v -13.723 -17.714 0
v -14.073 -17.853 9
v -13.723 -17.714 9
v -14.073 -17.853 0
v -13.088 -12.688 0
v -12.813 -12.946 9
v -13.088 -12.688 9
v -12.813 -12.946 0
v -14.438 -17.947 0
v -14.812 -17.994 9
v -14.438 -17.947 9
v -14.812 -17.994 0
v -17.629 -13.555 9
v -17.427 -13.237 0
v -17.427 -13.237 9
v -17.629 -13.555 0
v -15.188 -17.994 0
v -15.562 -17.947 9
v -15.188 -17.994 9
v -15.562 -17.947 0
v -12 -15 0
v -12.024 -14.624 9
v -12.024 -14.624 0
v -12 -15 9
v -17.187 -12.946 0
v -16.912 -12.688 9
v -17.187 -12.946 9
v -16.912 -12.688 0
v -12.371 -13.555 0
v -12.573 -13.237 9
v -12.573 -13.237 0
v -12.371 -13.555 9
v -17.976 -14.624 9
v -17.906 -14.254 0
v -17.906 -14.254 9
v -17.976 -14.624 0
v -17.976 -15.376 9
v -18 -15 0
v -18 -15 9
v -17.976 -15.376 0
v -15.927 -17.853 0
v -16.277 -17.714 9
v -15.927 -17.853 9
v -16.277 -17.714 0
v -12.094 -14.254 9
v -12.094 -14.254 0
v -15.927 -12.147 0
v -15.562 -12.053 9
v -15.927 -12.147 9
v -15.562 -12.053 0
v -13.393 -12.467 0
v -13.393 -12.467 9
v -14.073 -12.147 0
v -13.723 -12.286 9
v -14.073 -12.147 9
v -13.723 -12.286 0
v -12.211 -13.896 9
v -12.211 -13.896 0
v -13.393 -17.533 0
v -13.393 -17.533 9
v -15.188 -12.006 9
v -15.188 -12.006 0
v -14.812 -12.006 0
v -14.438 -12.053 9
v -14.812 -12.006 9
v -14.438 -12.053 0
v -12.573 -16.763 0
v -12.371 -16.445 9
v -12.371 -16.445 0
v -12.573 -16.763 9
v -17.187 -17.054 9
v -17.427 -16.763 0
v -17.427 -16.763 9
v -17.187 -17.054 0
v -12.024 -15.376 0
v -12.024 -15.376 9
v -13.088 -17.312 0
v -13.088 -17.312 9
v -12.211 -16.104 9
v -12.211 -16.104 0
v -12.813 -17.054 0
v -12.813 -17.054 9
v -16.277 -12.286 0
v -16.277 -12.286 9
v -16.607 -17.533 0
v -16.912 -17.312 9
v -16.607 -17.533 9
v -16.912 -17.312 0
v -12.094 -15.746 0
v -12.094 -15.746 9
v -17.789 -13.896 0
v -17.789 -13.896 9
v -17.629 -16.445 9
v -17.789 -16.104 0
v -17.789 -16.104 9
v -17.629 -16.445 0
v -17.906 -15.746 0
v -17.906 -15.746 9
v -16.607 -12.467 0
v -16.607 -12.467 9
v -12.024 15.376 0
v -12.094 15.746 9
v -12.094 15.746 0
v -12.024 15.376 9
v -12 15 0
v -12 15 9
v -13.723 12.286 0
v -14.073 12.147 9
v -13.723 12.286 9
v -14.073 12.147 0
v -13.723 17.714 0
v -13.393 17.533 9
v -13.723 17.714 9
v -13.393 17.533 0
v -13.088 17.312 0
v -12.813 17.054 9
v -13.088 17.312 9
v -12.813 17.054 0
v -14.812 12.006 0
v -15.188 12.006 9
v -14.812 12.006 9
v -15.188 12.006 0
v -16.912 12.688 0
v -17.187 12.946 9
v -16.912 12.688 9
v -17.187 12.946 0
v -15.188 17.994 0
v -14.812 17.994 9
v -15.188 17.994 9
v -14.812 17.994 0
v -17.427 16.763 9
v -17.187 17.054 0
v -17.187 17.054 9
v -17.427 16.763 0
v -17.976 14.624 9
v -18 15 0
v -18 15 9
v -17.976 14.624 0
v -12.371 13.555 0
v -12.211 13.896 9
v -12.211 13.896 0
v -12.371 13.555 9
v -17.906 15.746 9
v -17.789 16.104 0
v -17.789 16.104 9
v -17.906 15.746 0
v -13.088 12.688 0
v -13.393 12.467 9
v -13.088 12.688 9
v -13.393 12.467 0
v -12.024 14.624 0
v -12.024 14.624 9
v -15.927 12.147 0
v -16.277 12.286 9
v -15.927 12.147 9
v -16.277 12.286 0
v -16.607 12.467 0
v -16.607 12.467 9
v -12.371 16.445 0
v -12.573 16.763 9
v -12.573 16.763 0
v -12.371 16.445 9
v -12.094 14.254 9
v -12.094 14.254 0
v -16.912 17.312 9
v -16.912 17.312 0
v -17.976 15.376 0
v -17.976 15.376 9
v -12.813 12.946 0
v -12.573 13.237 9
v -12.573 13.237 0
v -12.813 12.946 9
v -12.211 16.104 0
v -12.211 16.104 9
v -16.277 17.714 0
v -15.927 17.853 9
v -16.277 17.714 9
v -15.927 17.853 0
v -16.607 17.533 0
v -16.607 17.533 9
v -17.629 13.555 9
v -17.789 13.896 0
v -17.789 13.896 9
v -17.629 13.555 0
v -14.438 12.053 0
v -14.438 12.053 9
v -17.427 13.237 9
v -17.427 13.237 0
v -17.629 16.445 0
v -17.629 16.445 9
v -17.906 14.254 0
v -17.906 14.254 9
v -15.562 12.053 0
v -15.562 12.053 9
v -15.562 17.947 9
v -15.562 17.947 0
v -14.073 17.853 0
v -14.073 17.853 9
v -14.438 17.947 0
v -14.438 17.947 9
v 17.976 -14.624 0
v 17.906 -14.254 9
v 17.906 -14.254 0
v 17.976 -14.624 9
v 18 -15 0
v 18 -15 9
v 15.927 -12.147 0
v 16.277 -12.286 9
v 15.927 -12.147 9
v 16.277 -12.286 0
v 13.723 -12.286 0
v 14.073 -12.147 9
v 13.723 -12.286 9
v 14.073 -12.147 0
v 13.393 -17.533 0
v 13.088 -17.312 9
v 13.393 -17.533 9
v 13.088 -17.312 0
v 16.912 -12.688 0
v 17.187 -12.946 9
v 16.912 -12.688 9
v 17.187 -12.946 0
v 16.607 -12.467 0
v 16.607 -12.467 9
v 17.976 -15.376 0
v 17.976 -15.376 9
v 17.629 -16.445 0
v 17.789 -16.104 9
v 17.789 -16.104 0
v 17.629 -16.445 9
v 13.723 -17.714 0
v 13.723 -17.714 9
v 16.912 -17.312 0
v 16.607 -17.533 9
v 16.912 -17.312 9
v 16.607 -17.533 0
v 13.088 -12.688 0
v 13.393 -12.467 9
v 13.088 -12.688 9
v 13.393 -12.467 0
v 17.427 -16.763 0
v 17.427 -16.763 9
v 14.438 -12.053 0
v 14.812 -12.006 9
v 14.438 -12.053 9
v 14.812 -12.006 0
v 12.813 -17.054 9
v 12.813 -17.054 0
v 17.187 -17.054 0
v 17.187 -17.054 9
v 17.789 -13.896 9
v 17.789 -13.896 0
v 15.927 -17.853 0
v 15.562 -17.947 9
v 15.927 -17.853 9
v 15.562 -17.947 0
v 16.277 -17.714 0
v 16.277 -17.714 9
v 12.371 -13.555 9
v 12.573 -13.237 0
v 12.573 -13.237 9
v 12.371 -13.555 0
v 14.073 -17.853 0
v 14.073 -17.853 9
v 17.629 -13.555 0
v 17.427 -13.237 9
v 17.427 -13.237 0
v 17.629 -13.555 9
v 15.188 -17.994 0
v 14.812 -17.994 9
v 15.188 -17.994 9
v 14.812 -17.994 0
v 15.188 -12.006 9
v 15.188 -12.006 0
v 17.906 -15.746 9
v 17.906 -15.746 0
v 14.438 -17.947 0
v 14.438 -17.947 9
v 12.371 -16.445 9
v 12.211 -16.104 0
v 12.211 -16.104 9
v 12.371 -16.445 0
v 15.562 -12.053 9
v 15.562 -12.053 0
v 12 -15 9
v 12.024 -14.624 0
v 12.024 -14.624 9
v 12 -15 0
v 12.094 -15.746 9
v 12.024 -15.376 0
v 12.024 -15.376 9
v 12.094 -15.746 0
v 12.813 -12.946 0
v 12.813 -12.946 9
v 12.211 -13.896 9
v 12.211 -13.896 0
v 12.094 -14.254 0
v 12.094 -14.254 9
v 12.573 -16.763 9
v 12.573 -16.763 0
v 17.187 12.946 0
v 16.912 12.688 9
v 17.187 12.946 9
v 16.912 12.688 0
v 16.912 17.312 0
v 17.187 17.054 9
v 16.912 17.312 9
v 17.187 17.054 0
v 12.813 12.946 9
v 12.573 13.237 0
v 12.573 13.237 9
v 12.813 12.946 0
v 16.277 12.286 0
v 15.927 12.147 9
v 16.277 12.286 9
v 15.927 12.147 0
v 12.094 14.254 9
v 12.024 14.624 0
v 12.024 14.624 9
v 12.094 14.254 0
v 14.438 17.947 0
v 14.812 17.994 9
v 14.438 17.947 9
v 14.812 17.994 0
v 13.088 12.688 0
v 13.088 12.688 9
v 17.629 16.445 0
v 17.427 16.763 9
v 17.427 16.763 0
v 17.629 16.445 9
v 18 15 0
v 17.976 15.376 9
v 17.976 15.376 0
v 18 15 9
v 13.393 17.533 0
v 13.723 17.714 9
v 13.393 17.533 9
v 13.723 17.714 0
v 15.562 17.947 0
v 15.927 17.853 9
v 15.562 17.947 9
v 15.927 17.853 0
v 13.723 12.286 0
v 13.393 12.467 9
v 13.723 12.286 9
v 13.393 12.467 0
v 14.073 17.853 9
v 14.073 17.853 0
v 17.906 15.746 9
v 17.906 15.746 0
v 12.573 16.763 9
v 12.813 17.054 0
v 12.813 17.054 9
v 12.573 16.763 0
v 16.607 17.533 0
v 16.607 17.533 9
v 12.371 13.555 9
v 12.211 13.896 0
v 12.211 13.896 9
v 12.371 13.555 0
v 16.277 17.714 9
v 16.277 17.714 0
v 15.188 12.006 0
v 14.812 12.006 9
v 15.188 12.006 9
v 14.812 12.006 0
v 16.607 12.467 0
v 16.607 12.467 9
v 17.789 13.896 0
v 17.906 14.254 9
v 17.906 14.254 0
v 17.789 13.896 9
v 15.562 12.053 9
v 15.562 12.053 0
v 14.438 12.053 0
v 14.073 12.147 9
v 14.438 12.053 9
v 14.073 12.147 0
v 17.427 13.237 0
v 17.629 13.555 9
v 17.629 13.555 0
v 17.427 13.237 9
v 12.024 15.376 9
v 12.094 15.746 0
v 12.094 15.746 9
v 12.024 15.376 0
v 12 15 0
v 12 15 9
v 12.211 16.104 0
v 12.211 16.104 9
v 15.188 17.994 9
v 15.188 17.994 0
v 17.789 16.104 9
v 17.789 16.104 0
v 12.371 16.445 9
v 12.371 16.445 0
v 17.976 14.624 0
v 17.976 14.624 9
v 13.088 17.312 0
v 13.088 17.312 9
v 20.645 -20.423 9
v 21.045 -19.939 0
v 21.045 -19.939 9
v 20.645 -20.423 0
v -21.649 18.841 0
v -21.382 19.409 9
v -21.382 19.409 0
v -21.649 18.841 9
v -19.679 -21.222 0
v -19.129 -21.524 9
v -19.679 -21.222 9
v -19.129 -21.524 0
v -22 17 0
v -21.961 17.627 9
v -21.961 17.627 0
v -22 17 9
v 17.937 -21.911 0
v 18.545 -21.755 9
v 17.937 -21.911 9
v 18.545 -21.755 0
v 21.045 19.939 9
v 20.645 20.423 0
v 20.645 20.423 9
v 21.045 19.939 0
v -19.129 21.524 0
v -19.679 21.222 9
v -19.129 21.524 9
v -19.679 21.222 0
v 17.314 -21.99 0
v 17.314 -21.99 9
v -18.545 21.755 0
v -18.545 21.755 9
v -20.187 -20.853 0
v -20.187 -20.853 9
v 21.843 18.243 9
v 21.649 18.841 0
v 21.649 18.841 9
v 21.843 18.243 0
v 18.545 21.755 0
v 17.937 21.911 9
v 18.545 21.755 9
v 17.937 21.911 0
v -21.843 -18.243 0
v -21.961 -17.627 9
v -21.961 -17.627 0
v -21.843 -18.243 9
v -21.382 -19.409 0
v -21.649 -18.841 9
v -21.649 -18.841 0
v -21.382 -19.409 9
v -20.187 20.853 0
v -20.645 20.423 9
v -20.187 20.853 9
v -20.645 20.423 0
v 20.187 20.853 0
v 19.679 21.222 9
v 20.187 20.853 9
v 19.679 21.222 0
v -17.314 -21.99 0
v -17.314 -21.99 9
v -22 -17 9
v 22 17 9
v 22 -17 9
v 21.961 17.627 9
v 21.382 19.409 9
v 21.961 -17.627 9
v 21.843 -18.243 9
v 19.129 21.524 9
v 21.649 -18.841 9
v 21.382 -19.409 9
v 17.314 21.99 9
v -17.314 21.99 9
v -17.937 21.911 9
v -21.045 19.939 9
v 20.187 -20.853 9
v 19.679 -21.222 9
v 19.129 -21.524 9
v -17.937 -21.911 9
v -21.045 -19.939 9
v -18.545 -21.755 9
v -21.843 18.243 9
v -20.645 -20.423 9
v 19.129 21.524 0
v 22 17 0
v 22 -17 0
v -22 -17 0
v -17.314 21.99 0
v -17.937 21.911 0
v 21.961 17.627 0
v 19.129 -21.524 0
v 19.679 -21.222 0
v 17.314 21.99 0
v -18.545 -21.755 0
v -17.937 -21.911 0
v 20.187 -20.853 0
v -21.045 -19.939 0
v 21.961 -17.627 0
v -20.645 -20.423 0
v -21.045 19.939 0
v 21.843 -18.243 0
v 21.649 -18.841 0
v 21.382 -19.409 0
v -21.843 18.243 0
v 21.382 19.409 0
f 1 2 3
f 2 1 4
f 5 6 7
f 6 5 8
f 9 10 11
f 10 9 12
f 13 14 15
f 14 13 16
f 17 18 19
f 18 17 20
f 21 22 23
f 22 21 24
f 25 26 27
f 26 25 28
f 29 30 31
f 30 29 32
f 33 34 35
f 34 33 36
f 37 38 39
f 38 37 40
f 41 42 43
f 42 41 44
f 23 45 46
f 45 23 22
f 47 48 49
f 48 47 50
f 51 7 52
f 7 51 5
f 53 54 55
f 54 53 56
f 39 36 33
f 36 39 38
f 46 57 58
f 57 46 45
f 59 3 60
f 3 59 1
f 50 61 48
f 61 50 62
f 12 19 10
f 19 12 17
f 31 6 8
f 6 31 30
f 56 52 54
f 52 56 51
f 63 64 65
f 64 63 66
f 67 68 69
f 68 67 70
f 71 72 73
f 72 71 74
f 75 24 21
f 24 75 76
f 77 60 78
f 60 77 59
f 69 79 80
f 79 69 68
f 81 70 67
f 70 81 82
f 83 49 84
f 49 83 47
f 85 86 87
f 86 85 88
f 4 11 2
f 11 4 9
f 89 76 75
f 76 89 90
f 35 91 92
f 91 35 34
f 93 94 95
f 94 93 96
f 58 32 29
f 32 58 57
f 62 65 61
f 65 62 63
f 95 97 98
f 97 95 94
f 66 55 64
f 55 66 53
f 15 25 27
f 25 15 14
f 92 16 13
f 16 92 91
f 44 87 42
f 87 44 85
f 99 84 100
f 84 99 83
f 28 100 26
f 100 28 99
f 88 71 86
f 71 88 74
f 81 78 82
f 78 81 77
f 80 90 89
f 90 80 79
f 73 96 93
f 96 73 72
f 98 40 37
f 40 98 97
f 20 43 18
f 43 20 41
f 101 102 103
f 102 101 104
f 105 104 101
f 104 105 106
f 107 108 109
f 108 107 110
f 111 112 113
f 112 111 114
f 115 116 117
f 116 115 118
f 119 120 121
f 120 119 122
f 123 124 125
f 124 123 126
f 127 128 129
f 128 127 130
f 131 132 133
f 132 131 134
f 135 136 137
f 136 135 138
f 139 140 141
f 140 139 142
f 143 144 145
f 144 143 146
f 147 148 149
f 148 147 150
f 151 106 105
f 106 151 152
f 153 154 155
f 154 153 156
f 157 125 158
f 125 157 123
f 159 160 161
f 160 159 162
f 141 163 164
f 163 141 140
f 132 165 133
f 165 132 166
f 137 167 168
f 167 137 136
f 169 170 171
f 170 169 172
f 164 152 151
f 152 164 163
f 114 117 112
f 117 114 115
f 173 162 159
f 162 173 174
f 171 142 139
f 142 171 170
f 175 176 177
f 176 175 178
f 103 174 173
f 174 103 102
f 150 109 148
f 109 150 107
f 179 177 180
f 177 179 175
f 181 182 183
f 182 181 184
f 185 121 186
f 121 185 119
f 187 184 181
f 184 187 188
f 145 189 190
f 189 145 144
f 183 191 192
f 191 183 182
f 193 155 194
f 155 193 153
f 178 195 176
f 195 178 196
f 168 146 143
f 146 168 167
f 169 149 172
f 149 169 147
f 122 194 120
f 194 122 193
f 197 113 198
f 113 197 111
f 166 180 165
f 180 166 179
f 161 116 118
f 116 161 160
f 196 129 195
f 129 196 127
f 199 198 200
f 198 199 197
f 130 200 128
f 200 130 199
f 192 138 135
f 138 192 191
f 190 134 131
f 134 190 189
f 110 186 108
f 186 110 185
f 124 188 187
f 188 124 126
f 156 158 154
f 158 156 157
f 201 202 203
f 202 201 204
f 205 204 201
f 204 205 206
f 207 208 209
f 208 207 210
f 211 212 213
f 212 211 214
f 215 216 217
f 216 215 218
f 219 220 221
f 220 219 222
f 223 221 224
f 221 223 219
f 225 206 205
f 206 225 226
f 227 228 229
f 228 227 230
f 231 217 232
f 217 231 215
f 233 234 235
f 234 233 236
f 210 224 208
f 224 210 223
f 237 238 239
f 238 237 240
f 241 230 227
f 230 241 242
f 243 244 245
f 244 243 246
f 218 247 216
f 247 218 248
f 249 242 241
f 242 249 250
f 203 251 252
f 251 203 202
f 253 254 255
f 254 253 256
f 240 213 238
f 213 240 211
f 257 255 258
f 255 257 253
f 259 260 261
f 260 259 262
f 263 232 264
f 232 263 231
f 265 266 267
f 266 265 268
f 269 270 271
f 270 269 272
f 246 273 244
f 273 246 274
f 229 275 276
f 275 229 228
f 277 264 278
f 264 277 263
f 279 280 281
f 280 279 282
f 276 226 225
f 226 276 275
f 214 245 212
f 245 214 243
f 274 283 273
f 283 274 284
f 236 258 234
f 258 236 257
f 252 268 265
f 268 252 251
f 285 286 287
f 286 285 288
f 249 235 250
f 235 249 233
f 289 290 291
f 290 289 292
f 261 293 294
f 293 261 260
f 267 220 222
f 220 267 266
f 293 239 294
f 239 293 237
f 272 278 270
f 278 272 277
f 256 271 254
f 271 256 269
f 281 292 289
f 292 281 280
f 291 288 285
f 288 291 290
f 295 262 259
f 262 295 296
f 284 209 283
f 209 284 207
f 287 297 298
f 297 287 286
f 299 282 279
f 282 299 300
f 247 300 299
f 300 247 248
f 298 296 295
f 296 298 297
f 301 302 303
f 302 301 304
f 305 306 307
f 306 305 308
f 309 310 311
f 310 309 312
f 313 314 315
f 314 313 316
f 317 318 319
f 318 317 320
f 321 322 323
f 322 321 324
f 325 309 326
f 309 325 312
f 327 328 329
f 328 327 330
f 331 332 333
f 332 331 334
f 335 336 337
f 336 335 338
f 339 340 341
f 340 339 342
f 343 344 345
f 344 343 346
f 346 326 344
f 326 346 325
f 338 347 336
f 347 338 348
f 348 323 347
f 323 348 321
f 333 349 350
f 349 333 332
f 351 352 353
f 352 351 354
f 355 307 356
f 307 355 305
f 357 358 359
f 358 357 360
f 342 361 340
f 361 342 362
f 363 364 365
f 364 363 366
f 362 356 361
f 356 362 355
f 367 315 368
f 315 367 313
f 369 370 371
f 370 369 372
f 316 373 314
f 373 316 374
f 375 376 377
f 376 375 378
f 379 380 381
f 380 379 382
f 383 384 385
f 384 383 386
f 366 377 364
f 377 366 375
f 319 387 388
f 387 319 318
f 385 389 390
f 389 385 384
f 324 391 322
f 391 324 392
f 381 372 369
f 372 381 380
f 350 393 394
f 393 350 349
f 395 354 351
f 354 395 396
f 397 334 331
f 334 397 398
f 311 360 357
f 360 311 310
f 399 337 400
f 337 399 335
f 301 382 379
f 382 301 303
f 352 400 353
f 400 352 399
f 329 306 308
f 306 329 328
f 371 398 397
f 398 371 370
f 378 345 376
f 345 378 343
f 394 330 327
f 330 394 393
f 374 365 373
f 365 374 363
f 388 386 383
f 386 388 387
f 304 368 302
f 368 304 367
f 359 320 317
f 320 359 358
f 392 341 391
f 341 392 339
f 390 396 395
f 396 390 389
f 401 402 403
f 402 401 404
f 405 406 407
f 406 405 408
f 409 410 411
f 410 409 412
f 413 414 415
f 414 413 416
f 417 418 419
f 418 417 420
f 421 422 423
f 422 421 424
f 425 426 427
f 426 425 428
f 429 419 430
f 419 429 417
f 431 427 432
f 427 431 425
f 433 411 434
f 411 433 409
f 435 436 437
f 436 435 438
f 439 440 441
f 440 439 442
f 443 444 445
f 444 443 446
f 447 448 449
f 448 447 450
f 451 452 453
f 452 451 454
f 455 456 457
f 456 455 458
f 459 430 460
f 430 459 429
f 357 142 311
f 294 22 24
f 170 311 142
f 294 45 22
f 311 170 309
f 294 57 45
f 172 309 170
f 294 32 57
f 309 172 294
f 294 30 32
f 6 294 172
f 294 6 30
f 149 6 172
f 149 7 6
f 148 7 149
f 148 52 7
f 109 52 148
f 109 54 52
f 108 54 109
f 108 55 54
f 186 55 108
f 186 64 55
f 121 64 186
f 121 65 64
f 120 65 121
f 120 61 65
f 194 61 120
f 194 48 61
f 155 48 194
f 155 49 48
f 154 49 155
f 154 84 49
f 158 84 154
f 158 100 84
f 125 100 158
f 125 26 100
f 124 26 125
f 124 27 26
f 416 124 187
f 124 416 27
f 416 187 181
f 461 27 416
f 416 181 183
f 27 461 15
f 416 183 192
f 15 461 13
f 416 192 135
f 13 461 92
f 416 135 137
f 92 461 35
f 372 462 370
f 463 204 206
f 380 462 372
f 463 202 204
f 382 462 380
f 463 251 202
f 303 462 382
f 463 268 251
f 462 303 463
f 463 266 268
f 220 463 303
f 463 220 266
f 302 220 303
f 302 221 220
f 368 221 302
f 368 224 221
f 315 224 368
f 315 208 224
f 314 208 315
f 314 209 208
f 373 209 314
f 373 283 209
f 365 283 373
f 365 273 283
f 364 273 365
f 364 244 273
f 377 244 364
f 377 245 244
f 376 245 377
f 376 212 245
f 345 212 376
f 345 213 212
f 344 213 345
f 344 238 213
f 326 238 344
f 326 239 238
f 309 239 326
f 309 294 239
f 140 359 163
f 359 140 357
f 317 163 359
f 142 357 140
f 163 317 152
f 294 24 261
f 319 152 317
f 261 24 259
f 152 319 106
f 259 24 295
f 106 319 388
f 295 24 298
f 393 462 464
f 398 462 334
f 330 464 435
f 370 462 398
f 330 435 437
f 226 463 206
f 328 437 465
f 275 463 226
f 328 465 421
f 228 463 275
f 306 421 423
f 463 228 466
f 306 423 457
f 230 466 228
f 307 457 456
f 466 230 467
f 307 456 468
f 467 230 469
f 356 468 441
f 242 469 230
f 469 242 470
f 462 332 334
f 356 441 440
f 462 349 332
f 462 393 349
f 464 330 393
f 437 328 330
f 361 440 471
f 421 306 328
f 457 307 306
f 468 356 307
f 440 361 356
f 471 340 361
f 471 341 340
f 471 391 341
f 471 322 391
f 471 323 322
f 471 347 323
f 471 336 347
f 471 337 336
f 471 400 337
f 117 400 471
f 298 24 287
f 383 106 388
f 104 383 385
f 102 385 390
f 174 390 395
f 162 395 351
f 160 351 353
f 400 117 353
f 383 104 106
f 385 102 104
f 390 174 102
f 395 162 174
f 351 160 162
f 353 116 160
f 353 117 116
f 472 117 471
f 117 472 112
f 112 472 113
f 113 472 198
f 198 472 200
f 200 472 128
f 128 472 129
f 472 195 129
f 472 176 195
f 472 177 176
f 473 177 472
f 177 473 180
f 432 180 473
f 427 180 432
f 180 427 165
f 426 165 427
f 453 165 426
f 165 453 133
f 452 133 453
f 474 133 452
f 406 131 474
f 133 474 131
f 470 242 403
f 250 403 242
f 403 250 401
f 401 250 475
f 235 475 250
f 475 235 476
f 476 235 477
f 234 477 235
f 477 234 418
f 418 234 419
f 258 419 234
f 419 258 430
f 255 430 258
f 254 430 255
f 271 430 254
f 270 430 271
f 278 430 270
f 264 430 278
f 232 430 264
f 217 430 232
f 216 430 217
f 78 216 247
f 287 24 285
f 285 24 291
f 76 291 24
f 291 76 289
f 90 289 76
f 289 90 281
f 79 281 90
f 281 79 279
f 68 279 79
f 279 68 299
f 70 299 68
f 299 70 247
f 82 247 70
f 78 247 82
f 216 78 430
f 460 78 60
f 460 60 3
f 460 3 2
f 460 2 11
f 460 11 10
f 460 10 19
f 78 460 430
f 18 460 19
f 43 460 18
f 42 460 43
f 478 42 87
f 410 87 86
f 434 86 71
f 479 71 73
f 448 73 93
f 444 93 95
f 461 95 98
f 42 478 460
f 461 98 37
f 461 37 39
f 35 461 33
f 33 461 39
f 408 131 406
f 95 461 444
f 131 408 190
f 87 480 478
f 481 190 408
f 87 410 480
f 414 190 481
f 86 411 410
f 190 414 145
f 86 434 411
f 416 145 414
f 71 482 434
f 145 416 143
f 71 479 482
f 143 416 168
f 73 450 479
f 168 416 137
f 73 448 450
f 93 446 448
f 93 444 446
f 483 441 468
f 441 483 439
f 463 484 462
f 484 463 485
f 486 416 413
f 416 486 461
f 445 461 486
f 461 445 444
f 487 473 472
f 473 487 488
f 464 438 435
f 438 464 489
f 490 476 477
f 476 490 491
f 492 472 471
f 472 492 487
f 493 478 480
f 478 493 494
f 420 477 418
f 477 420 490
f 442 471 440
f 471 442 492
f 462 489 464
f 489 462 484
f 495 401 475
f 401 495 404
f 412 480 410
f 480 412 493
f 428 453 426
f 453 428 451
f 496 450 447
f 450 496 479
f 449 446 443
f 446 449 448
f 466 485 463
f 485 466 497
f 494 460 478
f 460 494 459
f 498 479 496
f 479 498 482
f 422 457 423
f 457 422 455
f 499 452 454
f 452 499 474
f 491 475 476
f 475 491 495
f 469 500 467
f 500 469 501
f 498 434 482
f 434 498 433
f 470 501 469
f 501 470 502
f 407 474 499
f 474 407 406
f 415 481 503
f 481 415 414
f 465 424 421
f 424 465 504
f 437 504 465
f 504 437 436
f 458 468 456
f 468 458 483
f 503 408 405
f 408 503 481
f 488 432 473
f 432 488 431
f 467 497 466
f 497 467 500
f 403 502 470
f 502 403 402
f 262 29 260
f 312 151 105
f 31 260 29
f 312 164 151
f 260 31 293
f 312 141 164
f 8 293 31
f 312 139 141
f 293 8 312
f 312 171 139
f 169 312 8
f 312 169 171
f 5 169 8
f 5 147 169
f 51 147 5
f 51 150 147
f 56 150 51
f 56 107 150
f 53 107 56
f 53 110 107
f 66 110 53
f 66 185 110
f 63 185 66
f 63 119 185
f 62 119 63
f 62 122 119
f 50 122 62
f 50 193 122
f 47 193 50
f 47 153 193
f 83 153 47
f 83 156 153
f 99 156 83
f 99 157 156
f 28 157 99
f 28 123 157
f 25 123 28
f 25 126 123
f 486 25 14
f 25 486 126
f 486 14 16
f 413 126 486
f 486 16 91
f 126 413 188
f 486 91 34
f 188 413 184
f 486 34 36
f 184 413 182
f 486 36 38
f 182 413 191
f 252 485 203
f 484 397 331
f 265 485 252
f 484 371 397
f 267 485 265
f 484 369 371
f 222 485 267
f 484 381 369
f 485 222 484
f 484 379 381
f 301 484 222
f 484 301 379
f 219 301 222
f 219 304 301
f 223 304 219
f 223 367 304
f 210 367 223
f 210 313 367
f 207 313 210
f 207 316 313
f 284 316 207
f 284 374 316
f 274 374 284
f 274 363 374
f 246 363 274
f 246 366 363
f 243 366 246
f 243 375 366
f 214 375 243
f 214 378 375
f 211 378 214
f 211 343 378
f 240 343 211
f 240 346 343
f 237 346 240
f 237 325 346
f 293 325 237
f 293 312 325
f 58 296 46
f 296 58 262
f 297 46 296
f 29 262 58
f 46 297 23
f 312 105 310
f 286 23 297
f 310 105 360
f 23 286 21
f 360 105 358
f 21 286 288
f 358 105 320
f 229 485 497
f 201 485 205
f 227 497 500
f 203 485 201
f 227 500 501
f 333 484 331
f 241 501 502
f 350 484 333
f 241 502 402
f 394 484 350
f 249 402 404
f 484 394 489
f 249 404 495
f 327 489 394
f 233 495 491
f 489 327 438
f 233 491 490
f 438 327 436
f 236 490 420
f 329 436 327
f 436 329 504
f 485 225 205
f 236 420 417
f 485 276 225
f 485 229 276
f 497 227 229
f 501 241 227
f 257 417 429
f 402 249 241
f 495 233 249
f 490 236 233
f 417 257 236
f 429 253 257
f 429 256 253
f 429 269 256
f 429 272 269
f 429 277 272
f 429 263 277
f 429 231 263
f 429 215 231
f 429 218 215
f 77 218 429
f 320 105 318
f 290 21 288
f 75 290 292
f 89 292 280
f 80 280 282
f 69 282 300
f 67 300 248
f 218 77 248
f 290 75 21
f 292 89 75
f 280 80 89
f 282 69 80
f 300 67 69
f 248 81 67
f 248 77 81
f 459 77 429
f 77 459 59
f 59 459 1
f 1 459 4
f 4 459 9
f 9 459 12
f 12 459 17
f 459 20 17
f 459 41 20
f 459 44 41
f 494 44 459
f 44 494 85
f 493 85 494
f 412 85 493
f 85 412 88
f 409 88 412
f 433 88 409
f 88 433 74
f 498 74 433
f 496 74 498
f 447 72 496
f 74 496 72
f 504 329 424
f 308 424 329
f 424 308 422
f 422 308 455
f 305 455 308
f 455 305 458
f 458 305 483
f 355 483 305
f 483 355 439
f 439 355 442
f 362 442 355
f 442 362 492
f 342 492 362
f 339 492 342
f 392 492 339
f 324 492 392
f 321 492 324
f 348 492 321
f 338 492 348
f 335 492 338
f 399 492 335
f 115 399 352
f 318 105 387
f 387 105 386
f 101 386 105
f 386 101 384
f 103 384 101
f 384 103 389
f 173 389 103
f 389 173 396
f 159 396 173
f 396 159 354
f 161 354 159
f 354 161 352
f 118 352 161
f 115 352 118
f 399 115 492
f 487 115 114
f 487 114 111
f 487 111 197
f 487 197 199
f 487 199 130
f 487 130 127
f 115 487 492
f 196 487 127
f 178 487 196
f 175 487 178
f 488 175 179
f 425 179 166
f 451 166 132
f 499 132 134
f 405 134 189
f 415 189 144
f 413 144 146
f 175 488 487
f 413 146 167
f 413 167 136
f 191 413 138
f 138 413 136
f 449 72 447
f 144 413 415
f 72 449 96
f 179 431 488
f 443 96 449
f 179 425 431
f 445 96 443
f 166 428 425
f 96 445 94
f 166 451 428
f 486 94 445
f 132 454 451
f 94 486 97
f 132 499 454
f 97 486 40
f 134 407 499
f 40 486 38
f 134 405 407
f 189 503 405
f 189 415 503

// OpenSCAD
$fn = 50;


difference() {
	union() {
		hull() {
			translate(v = [-17.0000000000, 17.0000000000, 0]) {
				cylinder(h = 9, r = 5);
			}
			translate(v = [17.0000000000, 17.0000000000, 0]) {
				cylinder(h = 9, r = 5);
			}
			translate(v = [-17.0000000000, -17.0000000000, 0]) {
				cylinder(h = 9, r = 5);
			}
			translate(v = [17.0000000000, -17.0000000000, 0]) {
				cylinder(h = 9, r = 5);
			}
		}
	}
	union() {
		translate(v = [-15.0000000000, -15.0000000000, -100.0000000000]) {
			cylinder(h = 200, r = 3.0000000000);
		}
		translate(v = [-15.0000000000, 15.0000000000, -100.0000000000]) {
			cylinder(h = 200, r = 3.0000000000);
		}
		translate(v = [15.0000000000, -15.0000000000, -100.0000000000]) {
			cylinder(h = 200, r = 3.0000000000);
		}
		translate(v = [15.0000000000, 15.0000000000, -100.0000000000]) {
			cylinder(h = 200, r = 3.0000000000);
		}
	}
}
